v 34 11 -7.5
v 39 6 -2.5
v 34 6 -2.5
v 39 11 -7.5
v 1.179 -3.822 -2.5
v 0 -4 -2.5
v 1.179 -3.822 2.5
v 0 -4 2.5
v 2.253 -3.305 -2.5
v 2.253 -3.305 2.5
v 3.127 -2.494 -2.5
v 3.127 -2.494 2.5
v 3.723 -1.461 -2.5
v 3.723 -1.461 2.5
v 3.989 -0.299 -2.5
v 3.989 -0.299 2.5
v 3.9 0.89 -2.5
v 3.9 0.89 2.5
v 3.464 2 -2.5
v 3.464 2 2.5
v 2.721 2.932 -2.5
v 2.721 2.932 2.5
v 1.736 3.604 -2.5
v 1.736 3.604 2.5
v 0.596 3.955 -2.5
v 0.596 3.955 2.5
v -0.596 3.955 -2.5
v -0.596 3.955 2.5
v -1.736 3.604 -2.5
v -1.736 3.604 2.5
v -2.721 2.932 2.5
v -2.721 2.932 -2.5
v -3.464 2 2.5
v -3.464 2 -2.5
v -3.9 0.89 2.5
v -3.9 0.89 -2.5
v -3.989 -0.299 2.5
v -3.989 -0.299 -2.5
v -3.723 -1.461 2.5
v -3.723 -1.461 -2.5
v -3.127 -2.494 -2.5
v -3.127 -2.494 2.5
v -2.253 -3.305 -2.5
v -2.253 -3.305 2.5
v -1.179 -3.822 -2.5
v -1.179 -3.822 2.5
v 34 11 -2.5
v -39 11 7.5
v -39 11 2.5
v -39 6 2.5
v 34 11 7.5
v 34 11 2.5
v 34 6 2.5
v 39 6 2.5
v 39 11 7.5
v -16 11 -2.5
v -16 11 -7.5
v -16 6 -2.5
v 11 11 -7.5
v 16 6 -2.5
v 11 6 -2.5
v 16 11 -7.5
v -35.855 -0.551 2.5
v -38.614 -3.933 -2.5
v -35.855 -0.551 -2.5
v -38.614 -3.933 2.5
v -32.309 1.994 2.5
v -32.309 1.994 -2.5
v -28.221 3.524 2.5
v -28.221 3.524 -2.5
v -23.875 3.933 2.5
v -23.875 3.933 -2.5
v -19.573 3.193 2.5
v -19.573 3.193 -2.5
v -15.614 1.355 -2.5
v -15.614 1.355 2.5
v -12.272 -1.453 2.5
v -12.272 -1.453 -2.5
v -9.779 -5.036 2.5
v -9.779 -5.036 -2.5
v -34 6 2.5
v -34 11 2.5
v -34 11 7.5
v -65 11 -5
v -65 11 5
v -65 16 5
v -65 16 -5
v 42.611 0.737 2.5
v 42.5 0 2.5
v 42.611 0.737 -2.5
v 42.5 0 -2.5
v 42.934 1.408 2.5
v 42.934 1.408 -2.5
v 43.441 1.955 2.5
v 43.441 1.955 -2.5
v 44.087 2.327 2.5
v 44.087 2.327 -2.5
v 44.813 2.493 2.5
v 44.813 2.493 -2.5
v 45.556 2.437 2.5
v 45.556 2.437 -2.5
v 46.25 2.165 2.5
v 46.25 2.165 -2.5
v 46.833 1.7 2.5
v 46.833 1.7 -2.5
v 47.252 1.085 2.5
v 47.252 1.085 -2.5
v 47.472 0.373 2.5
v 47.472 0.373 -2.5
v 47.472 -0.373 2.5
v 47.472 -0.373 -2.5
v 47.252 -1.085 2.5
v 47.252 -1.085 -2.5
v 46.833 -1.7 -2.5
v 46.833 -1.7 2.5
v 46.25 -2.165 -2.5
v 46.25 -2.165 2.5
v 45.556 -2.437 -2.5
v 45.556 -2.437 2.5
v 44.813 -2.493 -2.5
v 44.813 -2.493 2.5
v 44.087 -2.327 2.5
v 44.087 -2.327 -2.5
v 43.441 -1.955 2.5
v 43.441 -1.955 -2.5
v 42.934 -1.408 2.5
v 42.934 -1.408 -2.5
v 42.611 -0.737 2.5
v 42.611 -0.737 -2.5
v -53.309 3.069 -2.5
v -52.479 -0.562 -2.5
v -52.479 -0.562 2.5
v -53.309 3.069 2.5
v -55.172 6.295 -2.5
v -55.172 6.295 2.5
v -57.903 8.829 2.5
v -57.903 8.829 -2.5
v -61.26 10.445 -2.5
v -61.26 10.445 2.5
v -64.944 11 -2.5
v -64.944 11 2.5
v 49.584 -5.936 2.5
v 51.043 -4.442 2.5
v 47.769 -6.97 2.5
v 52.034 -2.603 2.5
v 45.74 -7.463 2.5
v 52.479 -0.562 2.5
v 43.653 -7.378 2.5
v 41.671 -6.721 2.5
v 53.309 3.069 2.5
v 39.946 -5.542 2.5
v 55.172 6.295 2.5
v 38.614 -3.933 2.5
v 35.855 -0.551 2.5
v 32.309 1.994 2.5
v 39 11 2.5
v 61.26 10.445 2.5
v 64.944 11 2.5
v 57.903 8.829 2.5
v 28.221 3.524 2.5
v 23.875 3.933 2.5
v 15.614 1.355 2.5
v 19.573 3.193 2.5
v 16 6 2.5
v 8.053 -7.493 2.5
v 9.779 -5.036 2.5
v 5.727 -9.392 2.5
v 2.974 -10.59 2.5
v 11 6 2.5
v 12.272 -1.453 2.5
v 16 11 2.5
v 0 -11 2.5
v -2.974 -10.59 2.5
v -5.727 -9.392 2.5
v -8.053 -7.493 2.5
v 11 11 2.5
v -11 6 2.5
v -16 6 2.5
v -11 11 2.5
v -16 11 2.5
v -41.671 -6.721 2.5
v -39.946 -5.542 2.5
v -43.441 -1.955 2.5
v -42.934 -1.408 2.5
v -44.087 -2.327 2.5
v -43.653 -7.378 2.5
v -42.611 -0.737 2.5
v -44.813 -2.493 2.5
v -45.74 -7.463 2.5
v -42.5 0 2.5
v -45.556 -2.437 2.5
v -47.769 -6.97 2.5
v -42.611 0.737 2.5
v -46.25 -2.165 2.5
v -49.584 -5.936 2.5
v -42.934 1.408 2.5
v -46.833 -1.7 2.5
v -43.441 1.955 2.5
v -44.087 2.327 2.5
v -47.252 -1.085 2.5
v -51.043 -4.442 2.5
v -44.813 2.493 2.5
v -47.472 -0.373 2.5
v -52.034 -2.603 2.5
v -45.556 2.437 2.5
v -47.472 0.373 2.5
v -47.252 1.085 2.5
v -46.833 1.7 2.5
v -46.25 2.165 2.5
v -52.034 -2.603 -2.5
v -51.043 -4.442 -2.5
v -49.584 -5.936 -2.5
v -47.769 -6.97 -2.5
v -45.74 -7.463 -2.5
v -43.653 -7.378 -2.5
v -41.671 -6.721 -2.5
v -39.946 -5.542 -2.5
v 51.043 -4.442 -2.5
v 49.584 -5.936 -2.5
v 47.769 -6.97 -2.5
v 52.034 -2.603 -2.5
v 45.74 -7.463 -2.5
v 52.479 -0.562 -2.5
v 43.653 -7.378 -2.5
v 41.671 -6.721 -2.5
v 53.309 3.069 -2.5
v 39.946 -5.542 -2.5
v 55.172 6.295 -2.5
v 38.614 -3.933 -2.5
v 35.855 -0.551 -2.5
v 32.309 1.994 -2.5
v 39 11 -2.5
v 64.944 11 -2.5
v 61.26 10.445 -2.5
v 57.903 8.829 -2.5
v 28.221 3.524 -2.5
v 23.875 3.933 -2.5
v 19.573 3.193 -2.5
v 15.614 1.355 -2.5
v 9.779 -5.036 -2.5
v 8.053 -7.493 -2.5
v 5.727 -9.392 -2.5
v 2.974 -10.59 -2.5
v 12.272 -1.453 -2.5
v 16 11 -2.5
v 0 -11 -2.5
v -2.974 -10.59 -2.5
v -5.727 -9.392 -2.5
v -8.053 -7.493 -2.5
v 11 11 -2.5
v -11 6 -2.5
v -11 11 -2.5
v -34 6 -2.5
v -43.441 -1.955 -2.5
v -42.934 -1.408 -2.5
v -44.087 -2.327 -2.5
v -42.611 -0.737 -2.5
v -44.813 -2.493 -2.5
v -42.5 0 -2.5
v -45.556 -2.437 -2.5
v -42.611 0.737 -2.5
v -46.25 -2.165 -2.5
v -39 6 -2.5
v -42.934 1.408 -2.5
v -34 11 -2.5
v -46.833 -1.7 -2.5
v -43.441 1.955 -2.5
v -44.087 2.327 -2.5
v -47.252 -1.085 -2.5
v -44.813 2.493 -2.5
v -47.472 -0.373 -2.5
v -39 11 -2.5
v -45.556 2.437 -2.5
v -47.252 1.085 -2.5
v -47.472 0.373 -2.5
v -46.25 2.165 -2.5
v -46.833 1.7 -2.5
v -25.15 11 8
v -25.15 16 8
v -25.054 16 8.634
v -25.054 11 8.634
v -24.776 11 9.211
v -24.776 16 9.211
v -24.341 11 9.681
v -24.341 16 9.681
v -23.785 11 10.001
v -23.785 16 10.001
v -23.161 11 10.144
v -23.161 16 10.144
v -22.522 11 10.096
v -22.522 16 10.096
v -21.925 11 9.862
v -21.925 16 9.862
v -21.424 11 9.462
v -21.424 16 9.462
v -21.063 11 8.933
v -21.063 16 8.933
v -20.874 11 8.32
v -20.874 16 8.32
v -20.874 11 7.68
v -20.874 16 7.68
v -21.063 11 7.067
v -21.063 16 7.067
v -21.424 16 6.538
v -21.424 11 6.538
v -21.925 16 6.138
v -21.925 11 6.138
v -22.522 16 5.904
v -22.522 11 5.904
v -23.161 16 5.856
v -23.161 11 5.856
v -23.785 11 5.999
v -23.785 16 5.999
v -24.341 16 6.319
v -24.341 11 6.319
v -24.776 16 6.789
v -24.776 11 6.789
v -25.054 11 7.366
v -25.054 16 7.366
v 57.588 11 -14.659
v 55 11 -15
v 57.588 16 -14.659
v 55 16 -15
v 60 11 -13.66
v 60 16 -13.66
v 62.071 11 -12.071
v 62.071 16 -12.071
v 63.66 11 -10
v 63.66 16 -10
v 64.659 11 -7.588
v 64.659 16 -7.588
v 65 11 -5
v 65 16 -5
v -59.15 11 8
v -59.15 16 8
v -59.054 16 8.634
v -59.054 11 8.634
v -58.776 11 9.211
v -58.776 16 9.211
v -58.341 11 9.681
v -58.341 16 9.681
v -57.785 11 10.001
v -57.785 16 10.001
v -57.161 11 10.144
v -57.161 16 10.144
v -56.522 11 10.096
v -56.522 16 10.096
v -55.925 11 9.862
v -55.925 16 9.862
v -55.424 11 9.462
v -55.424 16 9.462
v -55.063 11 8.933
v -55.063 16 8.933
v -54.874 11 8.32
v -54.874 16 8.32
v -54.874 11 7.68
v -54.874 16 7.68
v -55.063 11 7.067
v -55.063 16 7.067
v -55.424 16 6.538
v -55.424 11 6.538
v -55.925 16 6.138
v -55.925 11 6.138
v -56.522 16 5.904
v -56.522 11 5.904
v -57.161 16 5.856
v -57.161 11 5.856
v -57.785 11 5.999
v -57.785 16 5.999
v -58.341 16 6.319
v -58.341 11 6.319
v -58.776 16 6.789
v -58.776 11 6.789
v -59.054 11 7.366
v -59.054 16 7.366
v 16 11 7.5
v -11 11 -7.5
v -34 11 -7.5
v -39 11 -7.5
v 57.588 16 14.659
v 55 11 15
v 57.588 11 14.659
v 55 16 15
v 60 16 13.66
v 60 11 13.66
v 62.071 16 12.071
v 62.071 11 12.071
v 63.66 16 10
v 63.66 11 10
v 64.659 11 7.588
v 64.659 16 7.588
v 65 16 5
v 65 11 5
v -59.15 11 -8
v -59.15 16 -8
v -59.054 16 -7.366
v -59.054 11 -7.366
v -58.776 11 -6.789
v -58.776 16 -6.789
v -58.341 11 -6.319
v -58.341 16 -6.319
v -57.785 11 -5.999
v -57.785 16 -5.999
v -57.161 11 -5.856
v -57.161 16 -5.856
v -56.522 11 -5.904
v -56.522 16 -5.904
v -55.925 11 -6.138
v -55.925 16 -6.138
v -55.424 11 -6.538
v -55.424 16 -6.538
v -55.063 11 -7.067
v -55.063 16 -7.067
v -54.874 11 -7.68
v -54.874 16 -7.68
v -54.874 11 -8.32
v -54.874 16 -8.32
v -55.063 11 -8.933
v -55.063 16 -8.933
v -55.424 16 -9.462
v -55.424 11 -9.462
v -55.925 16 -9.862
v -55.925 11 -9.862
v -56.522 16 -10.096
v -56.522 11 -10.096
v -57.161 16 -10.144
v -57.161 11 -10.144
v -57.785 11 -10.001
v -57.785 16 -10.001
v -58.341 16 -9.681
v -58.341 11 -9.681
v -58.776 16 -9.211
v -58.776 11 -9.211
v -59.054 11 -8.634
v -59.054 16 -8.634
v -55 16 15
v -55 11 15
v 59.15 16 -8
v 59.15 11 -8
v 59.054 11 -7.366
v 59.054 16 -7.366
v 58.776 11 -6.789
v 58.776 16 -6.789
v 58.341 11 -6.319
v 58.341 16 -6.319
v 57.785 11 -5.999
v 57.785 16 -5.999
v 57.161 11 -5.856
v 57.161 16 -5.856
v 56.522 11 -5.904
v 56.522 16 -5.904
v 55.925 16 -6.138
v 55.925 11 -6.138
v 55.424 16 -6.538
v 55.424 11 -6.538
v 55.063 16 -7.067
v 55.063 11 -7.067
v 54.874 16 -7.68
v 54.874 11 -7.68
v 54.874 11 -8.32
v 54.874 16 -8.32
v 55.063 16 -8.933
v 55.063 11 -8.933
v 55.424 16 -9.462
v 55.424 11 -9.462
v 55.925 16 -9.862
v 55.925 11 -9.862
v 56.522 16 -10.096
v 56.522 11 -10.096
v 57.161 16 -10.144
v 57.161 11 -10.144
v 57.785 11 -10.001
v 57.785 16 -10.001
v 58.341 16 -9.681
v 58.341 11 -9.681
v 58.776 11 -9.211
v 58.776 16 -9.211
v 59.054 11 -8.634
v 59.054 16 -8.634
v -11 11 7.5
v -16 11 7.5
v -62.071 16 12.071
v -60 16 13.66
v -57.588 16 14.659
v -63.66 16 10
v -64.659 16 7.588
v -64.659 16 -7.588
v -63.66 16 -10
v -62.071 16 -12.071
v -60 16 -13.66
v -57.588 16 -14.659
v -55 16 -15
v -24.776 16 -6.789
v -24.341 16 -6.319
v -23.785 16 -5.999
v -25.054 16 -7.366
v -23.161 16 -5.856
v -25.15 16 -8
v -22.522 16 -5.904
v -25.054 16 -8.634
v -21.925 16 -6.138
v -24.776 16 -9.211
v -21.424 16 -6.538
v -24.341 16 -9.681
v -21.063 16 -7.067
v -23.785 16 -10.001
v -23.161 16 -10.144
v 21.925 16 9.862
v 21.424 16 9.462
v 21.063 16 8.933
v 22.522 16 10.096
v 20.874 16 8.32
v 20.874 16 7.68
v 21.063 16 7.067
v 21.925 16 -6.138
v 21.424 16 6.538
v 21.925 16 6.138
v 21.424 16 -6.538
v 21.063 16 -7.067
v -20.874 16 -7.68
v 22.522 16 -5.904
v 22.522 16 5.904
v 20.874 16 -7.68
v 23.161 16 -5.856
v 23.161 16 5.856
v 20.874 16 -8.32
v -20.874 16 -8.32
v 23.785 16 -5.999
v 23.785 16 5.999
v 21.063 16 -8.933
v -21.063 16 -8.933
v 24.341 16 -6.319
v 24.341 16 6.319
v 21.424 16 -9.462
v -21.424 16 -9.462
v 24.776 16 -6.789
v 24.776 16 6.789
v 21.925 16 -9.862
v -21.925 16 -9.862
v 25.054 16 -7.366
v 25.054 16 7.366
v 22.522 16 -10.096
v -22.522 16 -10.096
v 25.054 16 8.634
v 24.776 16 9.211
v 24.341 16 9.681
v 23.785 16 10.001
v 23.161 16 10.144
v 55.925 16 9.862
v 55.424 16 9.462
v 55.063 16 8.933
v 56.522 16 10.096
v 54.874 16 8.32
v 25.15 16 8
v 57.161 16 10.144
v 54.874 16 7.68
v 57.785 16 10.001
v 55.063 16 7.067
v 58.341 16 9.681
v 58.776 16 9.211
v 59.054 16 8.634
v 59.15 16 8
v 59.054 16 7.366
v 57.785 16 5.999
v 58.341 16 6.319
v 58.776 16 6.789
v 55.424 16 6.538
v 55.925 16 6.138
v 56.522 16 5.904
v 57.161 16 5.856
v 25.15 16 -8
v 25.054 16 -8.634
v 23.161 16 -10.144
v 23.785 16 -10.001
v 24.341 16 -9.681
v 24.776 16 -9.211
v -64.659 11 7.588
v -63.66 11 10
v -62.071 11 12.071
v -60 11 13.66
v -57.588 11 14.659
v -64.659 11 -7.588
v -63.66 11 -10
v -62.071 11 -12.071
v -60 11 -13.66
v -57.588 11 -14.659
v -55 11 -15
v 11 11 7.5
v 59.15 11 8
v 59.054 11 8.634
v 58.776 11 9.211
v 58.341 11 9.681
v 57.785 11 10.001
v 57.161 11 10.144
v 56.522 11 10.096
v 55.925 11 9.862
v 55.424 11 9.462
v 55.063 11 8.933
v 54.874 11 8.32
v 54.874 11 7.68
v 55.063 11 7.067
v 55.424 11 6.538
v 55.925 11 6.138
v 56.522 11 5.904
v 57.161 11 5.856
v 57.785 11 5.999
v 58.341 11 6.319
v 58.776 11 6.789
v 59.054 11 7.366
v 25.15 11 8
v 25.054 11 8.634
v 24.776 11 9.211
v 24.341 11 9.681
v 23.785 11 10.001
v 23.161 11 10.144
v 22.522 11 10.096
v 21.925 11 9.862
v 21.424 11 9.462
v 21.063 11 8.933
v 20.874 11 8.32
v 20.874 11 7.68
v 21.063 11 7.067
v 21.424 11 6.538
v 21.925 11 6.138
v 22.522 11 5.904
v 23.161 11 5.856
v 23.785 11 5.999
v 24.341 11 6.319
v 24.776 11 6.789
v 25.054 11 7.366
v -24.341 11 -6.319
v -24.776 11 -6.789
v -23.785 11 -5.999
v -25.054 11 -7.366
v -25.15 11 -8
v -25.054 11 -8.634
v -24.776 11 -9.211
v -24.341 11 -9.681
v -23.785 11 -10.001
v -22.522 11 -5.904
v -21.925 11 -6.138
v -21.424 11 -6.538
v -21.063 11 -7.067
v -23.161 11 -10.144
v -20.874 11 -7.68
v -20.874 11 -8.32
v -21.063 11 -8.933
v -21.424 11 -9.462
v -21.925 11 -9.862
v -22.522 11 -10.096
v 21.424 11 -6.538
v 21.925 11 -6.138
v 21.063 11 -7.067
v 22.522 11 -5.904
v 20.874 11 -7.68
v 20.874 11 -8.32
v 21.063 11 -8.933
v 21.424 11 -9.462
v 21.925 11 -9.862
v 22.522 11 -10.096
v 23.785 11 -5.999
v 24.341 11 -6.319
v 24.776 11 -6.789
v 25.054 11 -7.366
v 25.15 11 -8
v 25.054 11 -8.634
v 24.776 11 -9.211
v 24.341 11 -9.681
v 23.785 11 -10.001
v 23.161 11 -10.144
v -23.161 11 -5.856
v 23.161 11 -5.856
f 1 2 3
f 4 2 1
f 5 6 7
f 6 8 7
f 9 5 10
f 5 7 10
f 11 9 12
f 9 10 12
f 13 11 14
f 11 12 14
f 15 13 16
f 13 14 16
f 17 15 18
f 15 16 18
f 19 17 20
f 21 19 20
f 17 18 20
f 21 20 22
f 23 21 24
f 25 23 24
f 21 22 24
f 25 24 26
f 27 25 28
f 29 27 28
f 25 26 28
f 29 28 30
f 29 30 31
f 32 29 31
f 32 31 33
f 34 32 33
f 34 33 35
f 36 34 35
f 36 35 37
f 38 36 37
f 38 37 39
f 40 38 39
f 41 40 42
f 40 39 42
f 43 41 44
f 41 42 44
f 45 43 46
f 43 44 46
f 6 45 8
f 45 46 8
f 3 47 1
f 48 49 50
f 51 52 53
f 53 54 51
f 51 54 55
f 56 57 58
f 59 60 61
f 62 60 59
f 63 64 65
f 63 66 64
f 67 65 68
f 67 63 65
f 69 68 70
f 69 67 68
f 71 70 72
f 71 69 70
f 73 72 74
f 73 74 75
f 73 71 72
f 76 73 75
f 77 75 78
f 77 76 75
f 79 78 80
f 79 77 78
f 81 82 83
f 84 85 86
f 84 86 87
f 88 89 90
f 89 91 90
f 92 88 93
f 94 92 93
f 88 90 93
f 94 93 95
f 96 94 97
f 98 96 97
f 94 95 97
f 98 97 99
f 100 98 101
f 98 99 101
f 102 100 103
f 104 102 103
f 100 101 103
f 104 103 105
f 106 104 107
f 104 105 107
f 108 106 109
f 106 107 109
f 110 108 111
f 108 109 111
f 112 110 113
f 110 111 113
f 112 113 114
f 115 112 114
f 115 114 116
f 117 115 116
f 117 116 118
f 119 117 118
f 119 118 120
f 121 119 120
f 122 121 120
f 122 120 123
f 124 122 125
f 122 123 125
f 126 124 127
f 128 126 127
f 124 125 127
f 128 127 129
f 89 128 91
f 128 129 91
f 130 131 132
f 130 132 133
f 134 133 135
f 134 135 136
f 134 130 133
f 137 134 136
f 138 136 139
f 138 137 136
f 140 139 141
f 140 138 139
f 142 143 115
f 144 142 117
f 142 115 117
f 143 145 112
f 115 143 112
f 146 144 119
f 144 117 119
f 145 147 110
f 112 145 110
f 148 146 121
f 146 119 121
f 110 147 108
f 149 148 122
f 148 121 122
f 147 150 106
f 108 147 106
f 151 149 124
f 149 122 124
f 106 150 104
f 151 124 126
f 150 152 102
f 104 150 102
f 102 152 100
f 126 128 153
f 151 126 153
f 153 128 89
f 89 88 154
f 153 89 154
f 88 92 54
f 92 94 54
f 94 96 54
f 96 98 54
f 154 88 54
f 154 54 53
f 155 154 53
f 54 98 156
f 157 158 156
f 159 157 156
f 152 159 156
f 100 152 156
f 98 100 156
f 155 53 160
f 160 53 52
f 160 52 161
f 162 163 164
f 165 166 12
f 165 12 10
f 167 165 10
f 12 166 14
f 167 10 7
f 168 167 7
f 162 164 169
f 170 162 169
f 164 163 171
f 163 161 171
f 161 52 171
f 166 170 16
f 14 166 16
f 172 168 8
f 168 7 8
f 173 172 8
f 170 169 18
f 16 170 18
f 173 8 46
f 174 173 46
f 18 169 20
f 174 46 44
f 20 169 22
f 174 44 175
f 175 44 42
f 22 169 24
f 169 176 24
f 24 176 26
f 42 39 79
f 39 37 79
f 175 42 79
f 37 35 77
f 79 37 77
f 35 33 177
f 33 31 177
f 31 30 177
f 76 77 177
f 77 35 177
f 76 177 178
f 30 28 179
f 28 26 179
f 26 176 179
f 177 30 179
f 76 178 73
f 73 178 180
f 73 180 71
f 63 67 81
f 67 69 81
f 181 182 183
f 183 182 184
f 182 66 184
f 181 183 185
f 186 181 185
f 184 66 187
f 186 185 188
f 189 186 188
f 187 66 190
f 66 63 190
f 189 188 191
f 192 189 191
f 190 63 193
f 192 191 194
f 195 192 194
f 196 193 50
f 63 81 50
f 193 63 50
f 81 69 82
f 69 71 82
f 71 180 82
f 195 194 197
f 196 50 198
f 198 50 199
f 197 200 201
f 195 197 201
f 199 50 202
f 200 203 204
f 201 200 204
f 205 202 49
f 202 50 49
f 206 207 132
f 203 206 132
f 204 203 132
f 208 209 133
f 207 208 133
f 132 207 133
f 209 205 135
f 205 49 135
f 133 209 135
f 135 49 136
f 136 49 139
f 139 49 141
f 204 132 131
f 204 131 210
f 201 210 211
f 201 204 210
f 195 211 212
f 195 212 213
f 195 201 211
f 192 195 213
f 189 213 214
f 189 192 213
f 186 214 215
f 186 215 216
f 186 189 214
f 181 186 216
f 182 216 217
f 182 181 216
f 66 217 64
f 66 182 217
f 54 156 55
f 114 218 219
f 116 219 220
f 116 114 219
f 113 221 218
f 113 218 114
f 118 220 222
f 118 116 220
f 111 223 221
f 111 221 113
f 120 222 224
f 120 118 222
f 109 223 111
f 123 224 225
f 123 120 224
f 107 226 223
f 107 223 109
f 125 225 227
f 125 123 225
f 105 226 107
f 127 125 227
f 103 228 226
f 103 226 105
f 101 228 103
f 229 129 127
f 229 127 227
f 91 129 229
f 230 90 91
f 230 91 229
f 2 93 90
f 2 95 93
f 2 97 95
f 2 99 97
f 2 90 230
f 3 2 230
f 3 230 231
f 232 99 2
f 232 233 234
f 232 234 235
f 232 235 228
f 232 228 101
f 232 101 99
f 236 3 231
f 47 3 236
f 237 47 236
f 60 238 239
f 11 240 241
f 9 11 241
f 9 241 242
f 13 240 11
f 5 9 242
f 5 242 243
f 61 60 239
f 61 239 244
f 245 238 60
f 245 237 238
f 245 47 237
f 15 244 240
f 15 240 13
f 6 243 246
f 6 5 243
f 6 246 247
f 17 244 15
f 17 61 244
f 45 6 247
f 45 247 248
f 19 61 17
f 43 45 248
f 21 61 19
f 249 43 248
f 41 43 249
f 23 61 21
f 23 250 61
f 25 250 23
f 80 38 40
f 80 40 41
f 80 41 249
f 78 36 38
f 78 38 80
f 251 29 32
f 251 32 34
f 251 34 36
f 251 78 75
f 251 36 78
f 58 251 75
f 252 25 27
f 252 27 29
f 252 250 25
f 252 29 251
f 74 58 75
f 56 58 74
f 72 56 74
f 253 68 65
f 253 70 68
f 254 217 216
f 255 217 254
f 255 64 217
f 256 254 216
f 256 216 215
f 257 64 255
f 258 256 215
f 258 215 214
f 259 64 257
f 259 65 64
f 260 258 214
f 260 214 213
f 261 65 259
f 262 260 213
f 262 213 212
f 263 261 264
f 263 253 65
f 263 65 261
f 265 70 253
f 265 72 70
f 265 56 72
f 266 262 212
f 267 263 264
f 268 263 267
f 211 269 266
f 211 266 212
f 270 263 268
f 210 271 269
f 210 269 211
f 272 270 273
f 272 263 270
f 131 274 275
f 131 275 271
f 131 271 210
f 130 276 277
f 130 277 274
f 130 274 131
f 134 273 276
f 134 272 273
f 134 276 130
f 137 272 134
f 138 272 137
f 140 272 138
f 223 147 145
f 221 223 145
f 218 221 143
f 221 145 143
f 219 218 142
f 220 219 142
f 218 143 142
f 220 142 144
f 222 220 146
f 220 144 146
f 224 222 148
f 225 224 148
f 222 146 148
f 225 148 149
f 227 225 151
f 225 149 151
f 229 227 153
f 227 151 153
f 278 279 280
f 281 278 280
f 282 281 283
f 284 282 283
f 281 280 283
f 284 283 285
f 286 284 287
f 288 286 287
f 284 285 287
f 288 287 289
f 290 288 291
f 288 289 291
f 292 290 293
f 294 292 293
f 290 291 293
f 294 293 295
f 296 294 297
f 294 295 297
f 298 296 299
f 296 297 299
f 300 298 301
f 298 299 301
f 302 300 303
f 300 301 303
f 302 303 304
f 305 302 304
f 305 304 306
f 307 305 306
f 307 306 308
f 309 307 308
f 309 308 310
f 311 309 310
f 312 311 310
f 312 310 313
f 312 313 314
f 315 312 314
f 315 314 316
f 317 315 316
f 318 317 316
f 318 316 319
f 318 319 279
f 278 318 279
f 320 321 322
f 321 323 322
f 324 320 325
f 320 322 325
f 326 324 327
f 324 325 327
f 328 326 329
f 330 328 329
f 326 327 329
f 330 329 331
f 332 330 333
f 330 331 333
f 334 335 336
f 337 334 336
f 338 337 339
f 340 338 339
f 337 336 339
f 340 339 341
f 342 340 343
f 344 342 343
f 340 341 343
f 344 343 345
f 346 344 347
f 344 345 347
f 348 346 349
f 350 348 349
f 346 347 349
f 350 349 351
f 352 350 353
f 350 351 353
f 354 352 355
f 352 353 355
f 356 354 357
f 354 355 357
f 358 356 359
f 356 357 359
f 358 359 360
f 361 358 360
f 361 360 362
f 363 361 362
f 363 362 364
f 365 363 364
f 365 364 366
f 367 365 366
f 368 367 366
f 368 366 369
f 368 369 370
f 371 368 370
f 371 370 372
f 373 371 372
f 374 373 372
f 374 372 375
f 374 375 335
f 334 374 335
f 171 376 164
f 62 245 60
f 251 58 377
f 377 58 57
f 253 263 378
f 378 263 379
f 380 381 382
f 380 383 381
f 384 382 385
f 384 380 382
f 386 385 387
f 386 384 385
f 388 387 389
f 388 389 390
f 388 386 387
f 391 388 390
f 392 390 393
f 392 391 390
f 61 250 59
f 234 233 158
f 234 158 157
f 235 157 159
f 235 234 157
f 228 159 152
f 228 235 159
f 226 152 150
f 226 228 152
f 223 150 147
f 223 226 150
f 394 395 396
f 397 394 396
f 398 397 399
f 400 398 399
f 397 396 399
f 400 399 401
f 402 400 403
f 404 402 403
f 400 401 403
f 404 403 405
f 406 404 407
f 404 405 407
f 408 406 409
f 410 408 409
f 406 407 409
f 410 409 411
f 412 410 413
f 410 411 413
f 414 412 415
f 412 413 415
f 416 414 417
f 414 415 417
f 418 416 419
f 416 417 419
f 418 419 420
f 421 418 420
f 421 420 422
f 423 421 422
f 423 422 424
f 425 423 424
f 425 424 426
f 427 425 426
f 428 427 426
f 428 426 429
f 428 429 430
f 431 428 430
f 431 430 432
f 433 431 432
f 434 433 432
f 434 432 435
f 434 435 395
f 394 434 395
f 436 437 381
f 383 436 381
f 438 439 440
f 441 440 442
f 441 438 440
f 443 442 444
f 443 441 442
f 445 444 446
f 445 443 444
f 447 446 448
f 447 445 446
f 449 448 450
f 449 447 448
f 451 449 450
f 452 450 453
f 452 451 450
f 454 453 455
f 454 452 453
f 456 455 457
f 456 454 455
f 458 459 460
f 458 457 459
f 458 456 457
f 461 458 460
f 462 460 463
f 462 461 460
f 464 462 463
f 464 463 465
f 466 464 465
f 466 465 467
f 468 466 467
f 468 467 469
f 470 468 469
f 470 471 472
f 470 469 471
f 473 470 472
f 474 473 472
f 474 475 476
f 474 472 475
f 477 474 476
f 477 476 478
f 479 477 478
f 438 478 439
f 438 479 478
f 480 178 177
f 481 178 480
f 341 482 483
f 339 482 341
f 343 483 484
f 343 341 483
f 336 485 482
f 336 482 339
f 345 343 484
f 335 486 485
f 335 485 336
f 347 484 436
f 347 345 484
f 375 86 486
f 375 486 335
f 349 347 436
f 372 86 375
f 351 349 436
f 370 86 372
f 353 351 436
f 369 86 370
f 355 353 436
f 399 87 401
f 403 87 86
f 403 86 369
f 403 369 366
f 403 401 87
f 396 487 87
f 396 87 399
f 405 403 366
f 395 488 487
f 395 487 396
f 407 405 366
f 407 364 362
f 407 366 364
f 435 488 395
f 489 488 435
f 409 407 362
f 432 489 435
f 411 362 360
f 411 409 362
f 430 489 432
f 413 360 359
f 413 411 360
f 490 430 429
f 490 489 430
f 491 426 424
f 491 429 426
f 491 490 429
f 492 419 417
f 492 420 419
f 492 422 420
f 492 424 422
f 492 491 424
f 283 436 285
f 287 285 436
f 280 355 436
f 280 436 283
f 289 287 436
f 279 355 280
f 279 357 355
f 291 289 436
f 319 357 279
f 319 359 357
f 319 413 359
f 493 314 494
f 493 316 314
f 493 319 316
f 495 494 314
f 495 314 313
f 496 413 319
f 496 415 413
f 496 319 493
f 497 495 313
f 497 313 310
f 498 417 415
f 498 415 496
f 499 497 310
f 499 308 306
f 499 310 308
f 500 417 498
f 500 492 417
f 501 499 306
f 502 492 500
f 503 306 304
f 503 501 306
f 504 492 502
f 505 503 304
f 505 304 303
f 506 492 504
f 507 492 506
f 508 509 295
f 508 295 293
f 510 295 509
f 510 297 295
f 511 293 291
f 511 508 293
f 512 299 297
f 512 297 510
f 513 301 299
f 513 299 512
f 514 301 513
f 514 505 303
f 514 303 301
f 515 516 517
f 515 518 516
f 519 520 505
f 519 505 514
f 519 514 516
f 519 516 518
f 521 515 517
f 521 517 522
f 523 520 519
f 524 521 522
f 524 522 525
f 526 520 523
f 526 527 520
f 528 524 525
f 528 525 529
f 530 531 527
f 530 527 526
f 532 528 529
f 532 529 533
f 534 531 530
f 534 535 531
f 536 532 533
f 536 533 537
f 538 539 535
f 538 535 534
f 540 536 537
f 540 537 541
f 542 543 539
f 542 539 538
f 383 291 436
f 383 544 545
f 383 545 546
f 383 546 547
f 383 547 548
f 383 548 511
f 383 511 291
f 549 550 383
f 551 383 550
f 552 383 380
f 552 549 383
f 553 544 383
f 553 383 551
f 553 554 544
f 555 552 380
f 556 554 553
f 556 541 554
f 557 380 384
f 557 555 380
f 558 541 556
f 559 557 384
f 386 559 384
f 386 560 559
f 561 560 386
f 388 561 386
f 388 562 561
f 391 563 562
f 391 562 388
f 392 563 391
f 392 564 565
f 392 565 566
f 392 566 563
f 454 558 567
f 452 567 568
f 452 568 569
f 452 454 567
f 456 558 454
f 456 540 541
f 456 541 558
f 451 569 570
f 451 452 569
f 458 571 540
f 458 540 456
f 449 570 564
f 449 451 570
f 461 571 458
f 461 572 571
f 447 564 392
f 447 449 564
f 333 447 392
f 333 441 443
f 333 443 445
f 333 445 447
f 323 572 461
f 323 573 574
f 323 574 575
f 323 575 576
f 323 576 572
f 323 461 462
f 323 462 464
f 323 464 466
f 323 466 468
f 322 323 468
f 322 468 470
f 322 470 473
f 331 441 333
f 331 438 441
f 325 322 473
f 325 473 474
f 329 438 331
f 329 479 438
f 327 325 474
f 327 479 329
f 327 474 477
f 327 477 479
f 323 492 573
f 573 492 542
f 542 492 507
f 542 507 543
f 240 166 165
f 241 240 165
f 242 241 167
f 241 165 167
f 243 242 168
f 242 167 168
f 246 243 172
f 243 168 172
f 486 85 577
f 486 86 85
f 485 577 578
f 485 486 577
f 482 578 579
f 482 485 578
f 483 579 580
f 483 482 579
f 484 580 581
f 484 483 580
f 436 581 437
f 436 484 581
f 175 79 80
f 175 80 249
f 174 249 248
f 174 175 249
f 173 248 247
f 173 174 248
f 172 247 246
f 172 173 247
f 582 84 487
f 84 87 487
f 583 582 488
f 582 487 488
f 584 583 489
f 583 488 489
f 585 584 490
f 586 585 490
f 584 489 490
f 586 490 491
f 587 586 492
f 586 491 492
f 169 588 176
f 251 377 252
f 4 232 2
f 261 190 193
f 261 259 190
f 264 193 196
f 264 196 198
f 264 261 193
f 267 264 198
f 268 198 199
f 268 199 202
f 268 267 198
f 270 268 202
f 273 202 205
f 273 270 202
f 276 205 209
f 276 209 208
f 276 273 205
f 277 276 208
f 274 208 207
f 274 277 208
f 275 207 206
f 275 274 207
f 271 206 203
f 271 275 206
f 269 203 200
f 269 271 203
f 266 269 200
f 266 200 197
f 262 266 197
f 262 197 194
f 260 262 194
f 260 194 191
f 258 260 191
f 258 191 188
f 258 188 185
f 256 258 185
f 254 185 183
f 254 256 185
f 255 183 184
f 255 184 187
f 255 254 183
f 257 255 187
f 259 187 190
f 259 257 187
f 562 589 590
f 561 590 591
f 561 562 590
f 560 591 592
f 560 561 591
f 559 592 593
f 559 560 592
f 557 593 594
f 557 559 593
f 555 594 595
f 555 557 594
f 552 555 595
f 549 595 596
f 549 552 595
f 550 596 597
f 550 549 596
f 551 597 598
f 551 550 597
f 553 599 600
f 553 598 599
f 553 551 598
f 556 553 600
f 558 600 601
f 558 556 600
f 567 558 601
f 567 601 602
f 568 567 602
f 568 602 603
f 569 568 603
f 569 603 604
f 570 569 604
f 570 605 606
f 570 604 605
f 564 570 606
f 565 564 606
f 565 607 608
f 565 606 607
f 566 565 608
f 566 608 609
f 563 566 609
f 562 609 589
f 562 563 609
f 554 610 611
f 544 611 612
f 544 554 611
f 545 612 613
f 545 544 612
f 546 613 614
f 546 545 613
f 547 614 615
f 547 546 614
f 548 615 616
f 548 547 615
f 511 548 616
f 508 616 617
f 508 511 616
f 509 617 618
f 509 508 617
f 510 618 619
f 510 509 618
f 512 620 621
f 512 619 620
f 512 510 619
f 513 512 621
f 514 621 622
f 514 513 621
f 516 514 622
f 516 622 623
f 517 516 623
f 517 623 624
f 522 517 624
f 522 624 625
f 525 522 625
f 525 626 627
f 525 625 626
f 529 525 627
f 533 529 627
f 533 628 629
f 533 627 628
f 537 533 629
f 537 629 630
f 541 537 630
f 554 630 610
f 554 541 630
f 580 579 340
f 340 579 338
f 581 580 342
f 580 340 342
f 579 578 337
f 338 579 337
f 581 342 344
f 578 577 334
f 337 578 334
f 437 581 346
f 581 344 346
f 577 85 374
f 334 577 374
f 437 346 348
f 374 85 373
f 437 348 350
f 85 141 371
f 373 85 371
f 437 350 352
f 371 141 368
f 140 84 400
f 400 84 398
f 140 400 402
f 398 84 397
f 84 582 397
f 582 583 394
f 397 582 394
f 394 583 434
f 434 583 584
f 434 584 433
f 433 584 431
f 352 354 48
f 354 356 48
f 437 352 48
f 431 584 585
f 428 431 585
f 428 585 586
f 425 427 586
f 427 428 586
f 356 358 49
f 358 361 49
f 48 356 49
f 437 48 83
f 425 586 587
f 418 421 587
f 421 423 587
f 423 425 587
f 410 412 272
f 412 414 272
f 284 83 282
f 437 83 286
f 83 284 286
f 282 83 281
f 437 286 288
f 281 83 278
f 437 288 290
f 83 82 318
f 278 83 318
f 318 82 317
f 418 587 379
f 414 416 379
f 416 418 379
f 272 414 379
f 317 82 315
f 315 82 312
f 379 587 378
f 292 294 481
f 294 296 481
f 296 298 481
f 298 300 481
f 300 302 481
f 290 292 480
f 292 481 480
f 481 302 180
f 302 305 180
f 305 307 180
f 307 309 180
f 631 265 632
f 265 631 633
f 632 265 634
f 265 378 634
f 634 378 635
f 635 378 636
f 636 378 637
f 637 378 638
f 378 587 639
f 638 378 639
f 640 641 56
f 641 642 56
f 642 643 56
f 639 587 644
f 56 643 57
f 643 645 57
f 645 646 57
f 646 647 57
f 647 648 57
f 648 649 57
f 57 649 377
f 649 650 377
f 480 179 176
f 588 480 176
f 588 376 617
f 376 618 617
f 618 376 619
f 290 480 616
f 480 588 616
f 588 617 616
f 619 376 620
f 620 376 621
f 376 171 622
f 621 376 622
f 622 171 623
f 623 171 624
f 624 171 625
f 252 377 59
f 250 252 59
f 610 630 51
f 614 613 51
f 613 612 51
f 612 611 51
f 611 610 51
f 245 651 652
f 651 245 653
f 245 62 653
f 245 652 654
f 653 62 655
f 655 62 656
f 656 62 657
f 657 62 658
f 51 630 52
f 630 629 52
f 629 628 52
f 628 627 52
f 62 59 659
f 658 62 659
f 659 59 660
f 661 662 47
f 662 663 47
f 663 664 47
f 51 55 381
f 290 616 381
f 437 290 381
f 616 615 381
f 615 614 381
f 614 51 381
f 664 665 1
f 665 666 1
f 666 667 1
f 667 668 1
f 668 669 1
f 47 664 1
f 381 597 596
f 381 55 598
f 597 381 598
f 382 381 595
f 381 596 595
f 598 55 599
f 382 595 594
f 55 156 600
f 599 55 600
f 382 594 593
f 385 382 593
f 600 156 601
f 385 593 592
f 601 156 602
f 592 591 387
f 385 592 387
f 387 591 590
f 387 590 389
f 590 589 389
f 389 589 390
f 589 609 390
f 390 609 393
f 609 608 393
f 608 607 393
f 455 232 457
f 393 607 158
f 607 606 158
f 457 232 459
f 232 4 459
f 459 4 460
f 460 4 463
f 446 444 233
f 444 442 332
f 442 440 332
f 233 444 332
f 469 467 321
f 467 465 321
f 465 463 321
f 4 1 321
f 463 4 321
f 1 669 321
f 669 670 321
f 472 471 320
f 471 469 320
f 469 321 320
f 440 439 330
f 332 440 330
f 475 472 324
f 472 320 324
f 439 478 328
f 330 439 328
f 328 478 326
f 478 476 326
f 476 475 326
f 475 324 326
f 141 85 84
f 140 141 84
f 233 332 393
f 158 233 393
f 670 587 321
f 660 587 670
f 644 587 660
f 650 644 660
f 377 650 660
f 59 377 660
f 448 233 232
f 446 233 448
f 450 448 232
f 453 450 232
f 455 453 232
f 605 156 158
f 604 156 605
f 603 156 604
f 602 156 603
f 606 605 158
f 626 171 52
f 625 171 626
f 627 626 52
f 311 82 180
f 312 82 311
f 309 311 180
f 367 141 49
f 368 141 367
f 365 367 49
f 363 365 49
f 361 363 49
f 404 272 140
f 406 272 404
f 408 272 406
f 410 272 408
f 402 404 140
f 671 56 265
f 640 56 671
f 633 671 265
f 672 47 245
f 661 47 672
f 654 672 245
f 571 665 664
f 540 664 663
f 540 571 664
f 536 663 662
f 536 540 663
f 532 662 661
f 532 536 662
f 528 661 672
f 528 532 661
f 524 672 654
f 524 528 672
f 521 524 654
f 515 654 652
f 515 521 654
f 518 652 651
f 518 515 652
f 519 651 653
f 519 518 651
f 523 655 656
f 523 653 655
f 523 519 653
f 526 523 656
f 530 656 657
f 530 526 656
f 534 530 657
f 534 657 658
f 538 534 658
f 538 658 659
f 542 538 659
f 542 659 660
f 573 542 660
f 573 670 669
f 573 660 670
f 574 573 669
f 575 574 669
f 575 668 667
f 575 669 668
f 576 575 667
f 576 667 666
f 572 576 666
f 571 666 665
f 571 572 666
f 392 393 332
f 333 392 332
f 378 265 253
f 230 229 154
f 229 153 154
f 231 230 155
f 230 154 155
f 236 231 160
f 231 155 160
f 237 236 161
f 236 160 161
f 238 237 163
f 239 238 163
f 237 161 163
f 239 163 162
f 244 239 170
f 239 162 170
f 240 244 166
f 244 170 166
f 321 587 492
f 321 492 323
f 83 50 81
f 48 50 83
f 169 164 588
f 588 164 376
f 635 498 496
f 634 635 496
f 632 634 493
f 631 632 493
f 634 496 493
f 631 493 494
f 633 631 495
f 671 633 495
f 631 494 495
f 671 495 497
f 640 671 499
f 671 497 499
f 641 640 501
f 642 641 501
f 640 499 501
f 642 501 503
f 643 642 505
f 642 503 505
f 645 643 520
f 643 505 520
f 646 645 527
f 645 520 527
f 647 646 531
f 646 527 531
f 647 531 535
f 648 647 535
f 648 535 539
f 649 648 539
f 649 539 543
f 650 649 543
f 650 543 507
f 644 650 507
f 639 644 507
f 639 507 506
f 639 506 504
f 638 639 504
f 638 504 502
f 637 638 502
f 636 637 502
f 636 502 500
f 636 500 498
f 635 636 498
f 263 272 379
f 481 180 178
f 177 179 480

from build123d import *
from build123d.topology import SkipClean

# Parameters (mm, degrees)
SKETCH1_R                                = 2.5
BOSS_EXTRUDE1_DEPTH                      = 2.5
SKETCH4_W                                = 130
SKETCH4_H                                = 30
BOSS_EXTRUDE2_DEPTH                      = 5
FILLET1_R                                = 10
FILLET2_R                                = 12.5
SKETCH5_R                                = 2.15
CUT_EXTRUDE1_DEPTH                       = 10
BOSS_EXTRUDE3_DEPTH                      = 2.5
LPATTERN1_COUNT                          = 2
LPATTERN1_PITCH                          = 23
MIRROR4_COPY_1_DEPTH                     = 2.5
MIRROR4_AT_THE_SECOND_PLANE_COPY_1_DEPTH = 2.5
MIRROR4_AT_THE_SECOND_PLANE_COPY_2_DEPTH = 2.5
MIRROR4_AT_THE_SECOND_PLANE_COPY_3_DEPTH = 2.5


with BuildPart() as part:
    # Sketch1 → Boss-Extrude1 (new, symmetric)
    with BuildSketch(Plane.XY):
        with BuildLine():
            ThreePointArc((-38.614160498, -3.933326056), (-23.874667518, 3.933250754), (-9.779272654, -5.036449778))
            ThreePointArc((-9.779272654, -5.036449778), (-5.727087063, -9.391510729), (0, -11))
            Line((0, -11), (0, -4))
            ThreePointArc((0, -4), (-4, 0), (0, 4))
            Line((0, 4), (0, 11))
            Line((0, 11), (-52.5, 11))
            Line((-52.5, 11), (-52.5, 0))
            ThreePointArc((-52.5, 0), (-47.044040574, -7.216086067), (-38.614160498, -3.933326056))
        make_face()
        with Locations((-45, 0)):
            Circle(SKETCH1_R, mode=Mode.SUBTRACT)
    boss_extrude1 = extrude(amount=BOSS_EXTRUDE1_DEPTH, both=True)

    # Mirror1: Boss-Extrude1 across plane
    with SkipClean():  # the faces are left unmerged after this step: merging them gives an invalid solid
        add(boss_extrude1.mirror(Plane(origin=(0, 0, -2.5), x_dir=(0, 0, 1), z_dir=(-1, 0, 0))))

    # Sketch4 → Boss-Extrude2 (add)
    with SkipClean():  # the faces are left unmerged after this step: merging them gives an invalid solid
        with BuildSketch(Plane(origin=(0, 11, 0), x_dir=(1, 0, 0), z_dir=(0, 1, 0))):
            Rectangle(SKETCH4_W, SKETCH4_H)
        extrude(amount=BOSS_EXTRUDE2_DEPTH)

    # Fillet1
    fillet1_edges = [part.edges().sort_by_distance(p)[0] for p in [
        (-65, 13.5, -15),
        (-65, 13.5, 15),
        (65, 13.5, 15),
        (65, 13.5, -15),
    ]]
    fillet(fillet1_edges, radius=FILLET1_R)

    # Fillet2
    # the kernel refuses this fillet: 12.5 mm, written as the material it adds along each edge
    with BuildSketch(Plane(origin=(-52.5, 11, -2.5), x_dir=(-1, 0, 0), z_dir=(0, 0, 1))) as fillet2_piece_1:
        with BuildLine():
            CenterArc((12.443670675, 12.5), FILLET2_R, 184.301222305, 85.698777695)
            Line((-0.021123497, 11.5625), (-1.267602914, 11.46875))
            ThreePointArc((-1.267602914, 11.46875), (-1.25, 11), (-1.25, 0))
            Line((-1.25, 0), (0, -1.25))
            Line((0, -1.25), (12.443670675, -1.25))
            Line((12.443670675, -1.25), (12.443670675, 0))
        make_face()
    extrude(amount=5)
    with BuildSketch(Plane(origin=(52.5, 11, -2.5), x_dir=(1, 0, 0), z_dir=(0, 0, 1))) as fillet2_piece_2:
        with BuildLine():
            CenterArc((12.443670675, -12.5), FILLET2_R, 90, 85.698777695)
            Line((-0.021123497, -11.5625), (-1.267602914, -11.46875))
            ThreePointArc((-1.267602914, -11.46875), (-1.25, -11), (-1.25, 0))
            Line((-1.25, 0), (0, 1.25))
            Line((0, 1.25), (12.443670675, 1.25))
            Line((12.443670675, 1.25), (12.443670675, 0))
        make_face()
    extrude(amount=5)

    # Sketch5 → Cut-Extrude1 (cut)
    with BuildSketch(Plane(origin=(0, 16, 0), x_dir=(1, 0, 0), z_dir=(0, 1, 0))):
        with Locations(Location((-57, -8, 0), (0, 0, 180))):
            Circle(SKETCH5_R)
        with Locations(Location((-57, 8, 0), (0, 0, 180))):
            Circle(SKETCH5_R)
        with Locations(Location((-23, -8, 0), (0, 0, 180))):
            Circle(SKETCH5_R)
        with Locations(Location((-23, 8, 0), (0, 0, 180))):
            Circle(SKETCH5_R)
    cut_extrude1 = extrude(amount=-CUT_EXTRUDE1_DEPTH, mode=Mode.SUBTRACT)

    # Mirror2: Cut-Extrude1 across plane
    add(cut_extrude1.mirror(Plane(origin=(0, 0, 0), x_dir=(0, 0, 1), z_dir=(1, 0, 0))), mode=Mode.SUBTRACT)

    # Sketch7 → Boss-Extrude3 (add, symmetric)
    with BuildSketch(Plane(origin=(36.5, 0, 0), x_dir=(0, 0, -1), z_dir=(1, 0, 0))):
        Polygon((5, 11), (2.5, 11), (2.5, 6), (7.5, 11), align=None)
    boss_extrude3 = extrude(amount=BOSS_EXTRUDE3_DEPTH, both=True)

    # LPattern1: Boss-Extrude3 ×2
    with Locations(*[(-i * LPATTERN1_PITCH, 0, 0) for i in range(1, LPATTERN1_COUNT)]):
        add(boss_extrude3)

    # Mirror4: Boss-Extrude3 across plane
    add(boss_extrude3.mirror(Plane.XY))

    # Mirror4 copy 1 sketch → Mirror4 copy 1 (add, symmetric)
    with BuildSketch(Plane(origin=(13.5, 0, 0), x_dir=(0, 0, 1), z_dir=(1, 0, 0))):
        Polygon((5, -11), (2.5, -11), (2.5, -6), (7.5, -11), align=None)
    extrude(amount=MIRROR4_COPY_1_DEPTH, both=True)

    # Mirror4 at the second plane: Boss-Extrude3 across plane
    add(boss_extrude3.mirror(Plane(origin=(0, 0, 0), x_dir=(0, 0, 1), z_dir=(1, 0, 0))))

    # Mirror4 at the second plane copy 1 sketc → Mirror4 at the second plane copy 1 (add, symmetric)
    with BuildSketch(Plane(origin=(-13.5, 0, 0), x_dir=(0, 0, -1), z_dir=(-1, 0, 0))):
        Polygon((5, -11), (2.5, -11), (2.5, -6), (7.5, -11), align=None)
    extrude(amount=MIRROR4_AT_THE_SECOND_PLANE_COPY_1_DEPTH, both=True)

    # Mirror4 at the second plane copy 2 sketc → Mirror4 at the second plane copy 2 (add, symmetric)
    with BuildSketch(Plane.ZY.offset(36.5)):
        Polygon((5, 11), (2.5, 11), (2.5, 6), (7.5, 11), align=None)
    extrude(amount=MIRROR4_AT_THE_SECOND_PLANE_COPY_2_DEPTH, both=True)

    # Mirror4 at the second plane copy 3 sketc → Mirror4 at the second plane copy 3 (add, symmetric)
    with BuildSketch(Plane.ZY.offset(13.5)):
        Polygon((5, 11), (2.5, 11), (2.5, 6), (7.5, 11), align=None)
    extrude(amount=MIRROR4_AT_THE_SECOND_PLANE_COPY_3_DEPTH, both=True)


solid = part.part
